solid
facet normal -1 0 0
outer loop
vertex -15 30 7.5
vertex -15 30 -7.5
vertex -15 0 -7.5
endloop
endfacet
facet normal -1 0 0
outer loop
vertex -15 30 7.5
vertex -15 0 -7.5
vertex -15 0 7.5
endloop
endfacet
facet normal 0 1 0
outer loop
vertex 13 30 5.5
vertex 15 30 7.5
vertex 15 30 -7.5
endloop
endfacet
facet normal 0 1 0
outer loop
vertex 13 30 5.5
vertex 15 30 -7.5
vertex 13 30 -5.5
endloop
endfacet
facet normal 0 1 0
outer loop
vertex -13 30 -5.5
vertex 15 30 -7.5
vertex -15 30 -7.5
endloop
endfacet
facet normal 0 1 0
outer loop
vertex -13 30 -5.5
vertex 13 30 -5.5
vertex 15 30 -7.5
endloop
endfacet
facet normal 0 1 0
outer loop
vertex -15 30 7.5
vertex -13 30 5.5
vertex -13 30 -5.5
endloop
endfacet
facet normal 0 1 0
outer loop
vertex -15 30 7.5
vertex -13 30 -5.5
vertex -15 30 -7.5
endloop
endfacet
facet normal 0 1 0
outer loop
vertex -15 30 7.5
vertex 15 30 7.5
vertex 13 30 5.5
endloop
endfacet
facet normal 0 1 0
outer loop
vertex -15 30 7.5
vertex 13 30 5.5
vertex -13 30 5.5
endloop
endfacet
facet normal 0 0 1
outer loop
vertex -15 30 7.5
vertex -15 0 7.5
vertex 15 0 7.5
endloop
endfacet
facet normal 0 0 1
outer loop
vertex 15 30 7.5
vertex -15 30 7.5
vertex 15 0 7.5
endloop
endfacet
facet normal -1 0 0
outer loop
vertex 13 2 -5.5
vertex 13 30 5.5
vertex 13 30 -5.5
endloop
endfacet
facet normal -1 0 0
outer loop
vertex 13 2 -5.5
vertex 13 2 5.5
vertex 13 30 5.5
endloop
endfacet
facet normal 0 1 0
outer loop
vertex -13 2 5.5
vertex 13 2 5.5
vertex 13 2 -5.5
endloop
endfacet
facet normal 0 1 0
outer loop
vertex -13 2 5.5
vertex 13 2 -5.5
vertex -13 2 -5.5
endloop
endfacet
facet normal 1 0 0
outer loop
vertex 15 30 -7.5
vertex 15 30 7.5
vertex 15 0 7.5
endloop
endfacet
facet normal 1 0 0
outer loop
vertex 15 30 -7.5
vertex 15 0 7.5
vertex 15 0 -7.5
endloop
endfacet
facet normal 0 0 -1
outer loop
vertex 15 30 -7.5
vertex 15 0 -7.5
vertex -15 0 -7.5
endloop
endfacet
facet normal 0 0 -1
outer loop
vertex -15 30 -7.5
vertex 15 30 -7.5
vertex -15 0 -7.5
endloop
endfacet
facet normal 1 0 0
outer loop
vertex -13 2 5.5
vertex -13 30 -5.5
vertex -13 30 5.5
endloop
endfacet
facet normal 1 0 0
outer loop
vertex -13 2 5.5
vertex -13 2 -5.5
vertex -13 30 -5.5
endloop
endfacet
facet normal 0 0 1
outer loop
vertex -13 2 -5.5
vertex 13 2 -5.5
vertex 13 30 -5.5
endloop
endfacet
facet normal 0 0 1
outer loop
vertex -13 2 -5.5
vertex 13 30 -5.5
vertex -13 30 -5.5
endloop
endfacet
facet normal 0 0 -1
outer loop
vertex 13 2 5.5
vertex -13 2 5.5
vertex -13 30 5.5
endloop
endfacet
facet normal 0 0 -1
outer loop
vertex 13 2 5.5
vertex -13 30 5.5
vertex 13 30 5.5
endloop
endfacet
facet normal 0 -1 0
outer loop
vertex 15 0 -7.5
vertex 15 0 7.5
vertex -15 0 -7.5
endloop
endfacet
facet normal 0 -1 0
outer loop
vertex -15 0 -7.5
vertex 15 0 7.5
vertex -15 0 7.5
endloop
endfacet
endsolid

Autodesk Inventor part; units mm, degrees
ref_plane "YZ Plane" through (0, 0, 0) normal (1, 0, 0) x (0, 1, 0)
ref_plane "XZ Plane" through (0, 0, 0) normal (0, 1, 0) x (-1, 0, 0)
ref_plane "XY Plane" through (0, 0, 0) normal (0, 0, 1) x (1, 0, 0)
sketch "Skizze1" plane through (0, 0, 0) normal (0, 1, 0) x (-1, 0, 0)
  line L0 (15, 7.5) -> (-15, 7.5)
  line L1 (-15, 7.5) -> (-15, -7.5)
  line L2 (-15, -7.5) -> (15, -7.5)
  line L3 (15, -7.5) -> (15, 7.5)
  point P0 (0, 0)
  dimension "d0" = 15
  dimension "d1" = 30
  dimension "d2" = 15
  dimension "d3" = 7.5
extrude "Extrusion1" add sketch "Skizze1" along normal blind 30
shell "Wandung1" thickness 2 removed faces 1 at (5, 30, 2.5)
properties part number "Servo Hatlerung"
